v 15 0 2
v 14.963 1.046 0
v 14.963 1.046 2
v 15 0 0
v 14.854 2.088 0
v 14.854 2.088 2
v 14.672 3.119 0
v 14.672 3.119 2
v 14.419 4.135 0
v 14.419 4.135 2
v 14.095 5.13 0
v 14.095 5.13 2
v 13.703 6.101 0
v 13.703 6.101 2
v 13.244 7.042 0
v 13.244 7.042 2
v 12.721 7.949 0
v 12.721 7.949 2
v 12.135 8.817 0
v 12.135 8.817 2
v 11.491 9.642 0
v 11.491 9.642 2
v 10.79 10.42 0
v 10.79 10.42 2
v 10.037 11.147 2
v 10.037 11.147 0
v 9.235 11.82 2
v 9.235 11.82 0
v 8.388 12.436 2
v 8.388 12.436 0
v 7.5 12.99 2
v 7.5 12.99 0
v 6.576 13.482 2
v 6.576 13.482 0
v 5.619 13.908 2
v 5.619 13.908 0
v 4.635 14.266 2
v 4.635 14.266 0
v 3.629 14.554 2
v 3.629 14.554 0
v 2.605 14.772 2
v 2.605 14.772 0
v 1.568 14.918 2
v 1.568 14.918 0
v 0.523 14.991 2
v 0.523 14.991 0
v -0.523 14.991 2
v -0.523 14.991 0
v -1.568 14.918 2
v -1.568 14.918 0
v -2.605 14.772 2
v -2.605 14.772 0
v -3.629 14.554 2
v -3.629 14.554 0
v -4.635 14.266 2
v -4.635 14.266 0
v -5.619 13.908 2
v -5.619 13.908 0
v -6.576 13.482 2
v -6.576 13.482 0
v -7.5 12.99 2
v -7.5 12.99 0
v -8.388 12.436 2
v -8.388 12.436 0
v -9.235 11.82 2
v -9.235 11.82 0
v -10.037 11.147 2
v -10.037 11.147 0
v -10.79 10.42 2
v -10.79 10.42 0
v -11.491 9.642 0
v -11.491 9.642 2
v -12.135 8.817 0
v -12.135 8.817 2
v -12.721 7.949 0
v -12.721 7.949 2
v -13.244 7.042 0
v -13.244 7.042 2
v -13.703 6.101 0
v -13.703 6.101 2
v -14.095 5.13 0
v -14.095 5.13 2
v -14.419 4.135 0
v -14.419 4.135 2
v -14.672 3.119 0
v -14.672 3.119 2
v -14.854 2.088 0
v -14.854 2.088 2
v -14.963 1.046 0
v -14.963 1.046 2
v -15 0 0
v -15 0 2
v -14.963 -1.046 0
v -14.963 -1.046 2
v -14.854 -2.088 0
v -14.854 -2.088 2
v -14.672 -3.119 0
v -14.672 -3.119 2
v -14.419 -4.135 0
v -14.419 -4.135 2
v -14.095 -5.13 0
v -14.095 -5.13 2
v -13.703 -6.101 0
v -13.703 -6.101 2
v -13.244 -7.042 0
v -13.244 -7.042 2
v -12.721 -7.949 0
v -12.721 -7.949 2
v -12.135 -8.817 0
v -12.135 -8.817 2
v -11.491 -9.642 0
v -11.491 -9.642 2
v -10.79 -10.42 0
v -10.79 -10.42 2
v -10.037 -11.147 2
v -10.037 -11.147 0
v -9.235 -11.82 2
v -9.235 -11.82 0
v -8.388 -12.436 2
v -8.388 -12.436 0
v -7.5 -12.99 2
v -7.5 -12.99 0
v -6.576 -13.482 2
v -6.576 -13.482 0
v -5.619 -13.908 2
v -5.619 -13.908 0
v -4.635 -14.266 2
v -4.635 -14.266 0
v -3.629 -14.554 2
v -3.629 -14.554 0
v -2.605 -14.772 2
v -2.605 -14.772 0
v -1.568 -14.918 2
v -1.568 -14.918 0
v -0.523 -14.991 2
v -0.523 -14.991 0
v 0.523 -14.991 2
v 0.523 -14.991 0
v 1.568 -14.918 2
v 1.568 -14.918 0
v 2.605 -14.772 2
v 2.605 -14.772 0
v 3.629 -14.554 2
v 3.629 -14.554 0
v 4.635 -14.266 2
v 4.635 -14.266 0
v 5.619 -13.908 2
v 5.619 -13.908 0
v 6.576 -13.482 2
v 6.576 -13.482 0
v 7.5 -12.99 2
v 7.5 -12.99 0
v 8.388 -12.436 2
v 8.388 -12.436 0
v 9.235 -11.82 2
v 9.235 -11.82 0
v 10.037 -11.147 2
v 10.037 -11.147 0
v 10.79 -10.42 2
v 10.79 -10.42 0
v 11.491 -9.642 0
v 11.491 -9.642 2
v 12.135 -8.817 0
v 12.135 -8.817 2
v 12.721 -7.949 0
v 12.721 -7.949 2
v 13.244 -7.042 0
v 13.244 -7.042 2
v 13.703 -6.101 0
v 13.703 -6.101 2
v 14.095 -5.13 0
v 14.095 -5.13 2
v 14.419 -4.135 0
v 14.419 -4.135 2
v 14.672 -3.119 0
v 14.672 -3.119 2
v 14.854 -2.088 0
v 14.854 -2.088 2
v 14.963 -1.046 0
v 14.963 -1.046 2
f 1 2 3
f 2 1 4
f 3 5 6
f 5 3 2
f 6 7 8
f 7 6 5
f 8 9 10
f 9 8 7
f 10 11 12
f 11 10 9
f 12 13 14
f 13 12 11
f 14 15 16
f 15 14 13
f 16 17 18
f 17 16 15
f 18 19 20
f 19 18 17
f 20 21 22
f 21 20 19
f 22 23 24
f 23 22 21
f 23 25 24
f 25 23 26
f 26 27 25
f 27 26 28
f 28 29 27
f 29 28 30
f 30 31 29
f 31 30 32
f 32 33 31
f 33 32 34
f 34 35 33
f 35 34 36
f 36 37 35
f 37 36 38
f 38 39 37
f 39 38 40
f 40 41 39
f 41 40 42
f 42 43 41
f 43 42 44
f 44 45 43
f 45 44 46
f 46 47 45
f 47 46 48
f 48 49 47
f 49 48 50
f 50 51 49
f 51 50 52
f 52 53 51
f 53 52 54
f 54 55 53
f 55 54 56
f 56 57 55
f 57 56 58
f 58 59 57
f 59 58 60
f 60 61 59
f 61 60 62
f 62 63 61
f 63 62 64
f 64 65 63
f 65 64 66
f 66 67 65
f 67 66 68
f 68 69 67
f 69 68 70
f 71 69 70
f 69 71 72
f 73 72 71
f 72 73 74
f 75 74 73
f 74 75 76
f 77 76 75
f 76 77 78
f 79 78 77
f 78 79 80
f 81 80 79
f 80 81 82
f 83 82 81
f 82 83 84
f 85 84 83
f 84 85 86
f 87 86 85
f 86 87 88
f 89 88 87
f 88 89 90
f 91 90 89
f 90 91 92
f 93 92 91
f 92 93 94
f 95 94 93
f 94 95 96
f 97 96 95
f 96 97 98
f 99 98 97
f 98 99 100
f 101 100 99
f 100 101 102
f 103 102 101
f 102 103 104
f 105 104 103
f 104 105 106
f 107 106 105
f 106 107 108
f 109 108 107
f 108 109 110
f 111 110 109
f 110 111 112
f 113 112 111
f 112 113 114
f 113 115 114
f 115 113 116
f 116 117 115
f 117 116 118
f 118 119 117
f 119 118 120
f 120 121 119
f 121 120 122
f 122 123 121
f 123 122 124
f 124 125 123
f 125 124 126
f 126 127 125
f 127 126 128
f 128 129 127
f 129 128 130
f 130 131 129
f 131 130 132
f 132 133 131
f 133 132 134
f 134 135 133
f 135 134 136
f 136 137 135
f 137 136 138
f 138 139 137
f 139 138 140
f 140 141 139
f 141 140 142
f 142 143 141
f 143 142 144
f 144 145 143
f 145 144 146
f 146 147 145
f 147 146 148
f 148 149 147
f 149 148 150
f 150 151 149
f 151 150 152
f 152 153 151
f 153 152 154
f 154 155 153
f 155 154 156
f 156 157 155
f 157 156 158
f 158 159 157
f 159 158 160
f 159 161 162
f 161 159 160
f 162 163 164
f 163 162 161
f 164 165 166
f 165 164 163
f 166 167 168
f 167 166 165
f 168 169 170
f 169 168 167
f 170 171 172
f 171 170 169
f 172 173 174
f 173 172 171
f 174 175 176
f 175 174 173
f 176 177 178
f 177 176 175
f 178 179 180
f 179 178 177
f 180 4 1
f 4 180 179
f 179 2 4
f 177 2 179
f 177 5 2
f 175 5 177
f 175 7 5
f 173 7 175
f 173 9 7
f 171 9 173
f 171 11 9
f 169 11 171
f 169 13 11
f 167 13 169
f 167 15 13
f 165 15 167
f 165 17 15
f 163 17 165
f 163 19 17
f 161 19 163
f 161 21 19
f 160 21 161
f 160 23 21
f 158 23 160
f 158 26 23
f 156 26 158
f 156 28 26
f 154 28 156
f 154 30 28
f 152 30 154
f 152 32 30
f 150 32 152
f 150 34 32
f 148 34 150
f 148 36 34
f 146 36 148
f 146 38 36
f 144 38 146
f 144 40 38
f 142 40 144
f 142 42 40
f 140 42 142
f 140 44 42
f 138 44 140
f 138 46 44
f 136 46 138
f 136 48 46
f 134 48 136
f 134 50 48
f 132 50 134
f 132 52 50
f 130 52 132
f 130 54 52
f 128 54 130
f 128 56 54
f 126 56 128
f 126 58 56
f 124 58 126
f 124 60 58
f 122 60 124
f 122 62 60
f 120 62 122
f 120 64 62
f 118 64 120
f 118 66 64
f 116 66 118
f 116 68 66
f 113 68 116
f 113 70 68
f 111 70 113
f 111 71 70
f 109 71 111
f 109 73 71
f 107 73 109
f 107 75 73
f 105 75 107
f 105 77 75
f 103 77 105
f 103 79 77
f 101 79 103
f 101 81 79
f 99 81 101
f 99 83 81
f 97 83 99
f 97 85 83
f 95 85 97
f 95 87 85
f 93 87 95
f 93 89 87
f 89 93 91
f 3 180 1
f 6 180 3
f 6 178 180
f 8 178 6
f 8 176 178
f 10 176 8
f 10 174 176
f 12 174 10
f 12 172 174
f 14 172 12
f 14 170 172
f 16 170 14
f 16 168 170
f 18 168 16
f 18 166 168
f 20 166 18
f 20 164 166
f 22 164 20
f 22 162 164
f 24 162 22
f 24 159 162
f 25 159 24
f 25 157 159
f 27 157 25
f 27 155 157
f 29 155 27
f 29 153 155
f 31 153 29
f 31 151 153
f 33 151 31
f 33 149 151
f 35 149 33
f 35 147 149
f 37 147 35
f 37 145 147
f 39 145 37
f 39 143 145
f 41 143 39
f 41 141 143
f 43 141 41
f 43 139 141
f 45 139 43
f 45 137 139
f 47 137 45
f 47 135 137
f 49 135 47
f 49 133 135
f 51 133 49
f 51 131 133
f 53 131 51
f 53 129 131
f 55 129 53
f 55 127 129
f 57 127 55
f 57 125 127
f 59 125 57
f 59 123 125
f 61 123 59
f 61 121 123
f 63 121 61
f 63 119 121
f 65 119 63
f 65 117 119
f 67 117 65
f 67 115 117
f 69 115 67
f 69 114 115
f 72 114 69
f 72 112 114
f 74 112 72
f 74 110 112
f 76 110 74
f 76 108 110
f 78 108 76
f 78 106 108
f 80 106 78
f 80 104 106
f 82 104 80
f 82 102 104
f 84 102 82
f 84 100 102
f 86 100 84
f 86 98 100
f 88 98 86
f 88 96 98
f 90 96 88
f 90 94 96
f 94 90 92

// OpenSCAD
// [FL_INDEX: keywords="openscad, 3d_parametric, Bandsaw_zero_clearance_insert, csg_solid" | COT="Parametric OpenSCAD design from 3DCodeverse"]
// Title: Bandsaw zero clearance insert

//------------parameters---------------------------
// diameter of circle
diameter=30;  
// Thickness 
thickness=2;  
// resolution
$fn=90;

//-------------------------------------------------
cylinder (r=diameter/2,h=thickness);
